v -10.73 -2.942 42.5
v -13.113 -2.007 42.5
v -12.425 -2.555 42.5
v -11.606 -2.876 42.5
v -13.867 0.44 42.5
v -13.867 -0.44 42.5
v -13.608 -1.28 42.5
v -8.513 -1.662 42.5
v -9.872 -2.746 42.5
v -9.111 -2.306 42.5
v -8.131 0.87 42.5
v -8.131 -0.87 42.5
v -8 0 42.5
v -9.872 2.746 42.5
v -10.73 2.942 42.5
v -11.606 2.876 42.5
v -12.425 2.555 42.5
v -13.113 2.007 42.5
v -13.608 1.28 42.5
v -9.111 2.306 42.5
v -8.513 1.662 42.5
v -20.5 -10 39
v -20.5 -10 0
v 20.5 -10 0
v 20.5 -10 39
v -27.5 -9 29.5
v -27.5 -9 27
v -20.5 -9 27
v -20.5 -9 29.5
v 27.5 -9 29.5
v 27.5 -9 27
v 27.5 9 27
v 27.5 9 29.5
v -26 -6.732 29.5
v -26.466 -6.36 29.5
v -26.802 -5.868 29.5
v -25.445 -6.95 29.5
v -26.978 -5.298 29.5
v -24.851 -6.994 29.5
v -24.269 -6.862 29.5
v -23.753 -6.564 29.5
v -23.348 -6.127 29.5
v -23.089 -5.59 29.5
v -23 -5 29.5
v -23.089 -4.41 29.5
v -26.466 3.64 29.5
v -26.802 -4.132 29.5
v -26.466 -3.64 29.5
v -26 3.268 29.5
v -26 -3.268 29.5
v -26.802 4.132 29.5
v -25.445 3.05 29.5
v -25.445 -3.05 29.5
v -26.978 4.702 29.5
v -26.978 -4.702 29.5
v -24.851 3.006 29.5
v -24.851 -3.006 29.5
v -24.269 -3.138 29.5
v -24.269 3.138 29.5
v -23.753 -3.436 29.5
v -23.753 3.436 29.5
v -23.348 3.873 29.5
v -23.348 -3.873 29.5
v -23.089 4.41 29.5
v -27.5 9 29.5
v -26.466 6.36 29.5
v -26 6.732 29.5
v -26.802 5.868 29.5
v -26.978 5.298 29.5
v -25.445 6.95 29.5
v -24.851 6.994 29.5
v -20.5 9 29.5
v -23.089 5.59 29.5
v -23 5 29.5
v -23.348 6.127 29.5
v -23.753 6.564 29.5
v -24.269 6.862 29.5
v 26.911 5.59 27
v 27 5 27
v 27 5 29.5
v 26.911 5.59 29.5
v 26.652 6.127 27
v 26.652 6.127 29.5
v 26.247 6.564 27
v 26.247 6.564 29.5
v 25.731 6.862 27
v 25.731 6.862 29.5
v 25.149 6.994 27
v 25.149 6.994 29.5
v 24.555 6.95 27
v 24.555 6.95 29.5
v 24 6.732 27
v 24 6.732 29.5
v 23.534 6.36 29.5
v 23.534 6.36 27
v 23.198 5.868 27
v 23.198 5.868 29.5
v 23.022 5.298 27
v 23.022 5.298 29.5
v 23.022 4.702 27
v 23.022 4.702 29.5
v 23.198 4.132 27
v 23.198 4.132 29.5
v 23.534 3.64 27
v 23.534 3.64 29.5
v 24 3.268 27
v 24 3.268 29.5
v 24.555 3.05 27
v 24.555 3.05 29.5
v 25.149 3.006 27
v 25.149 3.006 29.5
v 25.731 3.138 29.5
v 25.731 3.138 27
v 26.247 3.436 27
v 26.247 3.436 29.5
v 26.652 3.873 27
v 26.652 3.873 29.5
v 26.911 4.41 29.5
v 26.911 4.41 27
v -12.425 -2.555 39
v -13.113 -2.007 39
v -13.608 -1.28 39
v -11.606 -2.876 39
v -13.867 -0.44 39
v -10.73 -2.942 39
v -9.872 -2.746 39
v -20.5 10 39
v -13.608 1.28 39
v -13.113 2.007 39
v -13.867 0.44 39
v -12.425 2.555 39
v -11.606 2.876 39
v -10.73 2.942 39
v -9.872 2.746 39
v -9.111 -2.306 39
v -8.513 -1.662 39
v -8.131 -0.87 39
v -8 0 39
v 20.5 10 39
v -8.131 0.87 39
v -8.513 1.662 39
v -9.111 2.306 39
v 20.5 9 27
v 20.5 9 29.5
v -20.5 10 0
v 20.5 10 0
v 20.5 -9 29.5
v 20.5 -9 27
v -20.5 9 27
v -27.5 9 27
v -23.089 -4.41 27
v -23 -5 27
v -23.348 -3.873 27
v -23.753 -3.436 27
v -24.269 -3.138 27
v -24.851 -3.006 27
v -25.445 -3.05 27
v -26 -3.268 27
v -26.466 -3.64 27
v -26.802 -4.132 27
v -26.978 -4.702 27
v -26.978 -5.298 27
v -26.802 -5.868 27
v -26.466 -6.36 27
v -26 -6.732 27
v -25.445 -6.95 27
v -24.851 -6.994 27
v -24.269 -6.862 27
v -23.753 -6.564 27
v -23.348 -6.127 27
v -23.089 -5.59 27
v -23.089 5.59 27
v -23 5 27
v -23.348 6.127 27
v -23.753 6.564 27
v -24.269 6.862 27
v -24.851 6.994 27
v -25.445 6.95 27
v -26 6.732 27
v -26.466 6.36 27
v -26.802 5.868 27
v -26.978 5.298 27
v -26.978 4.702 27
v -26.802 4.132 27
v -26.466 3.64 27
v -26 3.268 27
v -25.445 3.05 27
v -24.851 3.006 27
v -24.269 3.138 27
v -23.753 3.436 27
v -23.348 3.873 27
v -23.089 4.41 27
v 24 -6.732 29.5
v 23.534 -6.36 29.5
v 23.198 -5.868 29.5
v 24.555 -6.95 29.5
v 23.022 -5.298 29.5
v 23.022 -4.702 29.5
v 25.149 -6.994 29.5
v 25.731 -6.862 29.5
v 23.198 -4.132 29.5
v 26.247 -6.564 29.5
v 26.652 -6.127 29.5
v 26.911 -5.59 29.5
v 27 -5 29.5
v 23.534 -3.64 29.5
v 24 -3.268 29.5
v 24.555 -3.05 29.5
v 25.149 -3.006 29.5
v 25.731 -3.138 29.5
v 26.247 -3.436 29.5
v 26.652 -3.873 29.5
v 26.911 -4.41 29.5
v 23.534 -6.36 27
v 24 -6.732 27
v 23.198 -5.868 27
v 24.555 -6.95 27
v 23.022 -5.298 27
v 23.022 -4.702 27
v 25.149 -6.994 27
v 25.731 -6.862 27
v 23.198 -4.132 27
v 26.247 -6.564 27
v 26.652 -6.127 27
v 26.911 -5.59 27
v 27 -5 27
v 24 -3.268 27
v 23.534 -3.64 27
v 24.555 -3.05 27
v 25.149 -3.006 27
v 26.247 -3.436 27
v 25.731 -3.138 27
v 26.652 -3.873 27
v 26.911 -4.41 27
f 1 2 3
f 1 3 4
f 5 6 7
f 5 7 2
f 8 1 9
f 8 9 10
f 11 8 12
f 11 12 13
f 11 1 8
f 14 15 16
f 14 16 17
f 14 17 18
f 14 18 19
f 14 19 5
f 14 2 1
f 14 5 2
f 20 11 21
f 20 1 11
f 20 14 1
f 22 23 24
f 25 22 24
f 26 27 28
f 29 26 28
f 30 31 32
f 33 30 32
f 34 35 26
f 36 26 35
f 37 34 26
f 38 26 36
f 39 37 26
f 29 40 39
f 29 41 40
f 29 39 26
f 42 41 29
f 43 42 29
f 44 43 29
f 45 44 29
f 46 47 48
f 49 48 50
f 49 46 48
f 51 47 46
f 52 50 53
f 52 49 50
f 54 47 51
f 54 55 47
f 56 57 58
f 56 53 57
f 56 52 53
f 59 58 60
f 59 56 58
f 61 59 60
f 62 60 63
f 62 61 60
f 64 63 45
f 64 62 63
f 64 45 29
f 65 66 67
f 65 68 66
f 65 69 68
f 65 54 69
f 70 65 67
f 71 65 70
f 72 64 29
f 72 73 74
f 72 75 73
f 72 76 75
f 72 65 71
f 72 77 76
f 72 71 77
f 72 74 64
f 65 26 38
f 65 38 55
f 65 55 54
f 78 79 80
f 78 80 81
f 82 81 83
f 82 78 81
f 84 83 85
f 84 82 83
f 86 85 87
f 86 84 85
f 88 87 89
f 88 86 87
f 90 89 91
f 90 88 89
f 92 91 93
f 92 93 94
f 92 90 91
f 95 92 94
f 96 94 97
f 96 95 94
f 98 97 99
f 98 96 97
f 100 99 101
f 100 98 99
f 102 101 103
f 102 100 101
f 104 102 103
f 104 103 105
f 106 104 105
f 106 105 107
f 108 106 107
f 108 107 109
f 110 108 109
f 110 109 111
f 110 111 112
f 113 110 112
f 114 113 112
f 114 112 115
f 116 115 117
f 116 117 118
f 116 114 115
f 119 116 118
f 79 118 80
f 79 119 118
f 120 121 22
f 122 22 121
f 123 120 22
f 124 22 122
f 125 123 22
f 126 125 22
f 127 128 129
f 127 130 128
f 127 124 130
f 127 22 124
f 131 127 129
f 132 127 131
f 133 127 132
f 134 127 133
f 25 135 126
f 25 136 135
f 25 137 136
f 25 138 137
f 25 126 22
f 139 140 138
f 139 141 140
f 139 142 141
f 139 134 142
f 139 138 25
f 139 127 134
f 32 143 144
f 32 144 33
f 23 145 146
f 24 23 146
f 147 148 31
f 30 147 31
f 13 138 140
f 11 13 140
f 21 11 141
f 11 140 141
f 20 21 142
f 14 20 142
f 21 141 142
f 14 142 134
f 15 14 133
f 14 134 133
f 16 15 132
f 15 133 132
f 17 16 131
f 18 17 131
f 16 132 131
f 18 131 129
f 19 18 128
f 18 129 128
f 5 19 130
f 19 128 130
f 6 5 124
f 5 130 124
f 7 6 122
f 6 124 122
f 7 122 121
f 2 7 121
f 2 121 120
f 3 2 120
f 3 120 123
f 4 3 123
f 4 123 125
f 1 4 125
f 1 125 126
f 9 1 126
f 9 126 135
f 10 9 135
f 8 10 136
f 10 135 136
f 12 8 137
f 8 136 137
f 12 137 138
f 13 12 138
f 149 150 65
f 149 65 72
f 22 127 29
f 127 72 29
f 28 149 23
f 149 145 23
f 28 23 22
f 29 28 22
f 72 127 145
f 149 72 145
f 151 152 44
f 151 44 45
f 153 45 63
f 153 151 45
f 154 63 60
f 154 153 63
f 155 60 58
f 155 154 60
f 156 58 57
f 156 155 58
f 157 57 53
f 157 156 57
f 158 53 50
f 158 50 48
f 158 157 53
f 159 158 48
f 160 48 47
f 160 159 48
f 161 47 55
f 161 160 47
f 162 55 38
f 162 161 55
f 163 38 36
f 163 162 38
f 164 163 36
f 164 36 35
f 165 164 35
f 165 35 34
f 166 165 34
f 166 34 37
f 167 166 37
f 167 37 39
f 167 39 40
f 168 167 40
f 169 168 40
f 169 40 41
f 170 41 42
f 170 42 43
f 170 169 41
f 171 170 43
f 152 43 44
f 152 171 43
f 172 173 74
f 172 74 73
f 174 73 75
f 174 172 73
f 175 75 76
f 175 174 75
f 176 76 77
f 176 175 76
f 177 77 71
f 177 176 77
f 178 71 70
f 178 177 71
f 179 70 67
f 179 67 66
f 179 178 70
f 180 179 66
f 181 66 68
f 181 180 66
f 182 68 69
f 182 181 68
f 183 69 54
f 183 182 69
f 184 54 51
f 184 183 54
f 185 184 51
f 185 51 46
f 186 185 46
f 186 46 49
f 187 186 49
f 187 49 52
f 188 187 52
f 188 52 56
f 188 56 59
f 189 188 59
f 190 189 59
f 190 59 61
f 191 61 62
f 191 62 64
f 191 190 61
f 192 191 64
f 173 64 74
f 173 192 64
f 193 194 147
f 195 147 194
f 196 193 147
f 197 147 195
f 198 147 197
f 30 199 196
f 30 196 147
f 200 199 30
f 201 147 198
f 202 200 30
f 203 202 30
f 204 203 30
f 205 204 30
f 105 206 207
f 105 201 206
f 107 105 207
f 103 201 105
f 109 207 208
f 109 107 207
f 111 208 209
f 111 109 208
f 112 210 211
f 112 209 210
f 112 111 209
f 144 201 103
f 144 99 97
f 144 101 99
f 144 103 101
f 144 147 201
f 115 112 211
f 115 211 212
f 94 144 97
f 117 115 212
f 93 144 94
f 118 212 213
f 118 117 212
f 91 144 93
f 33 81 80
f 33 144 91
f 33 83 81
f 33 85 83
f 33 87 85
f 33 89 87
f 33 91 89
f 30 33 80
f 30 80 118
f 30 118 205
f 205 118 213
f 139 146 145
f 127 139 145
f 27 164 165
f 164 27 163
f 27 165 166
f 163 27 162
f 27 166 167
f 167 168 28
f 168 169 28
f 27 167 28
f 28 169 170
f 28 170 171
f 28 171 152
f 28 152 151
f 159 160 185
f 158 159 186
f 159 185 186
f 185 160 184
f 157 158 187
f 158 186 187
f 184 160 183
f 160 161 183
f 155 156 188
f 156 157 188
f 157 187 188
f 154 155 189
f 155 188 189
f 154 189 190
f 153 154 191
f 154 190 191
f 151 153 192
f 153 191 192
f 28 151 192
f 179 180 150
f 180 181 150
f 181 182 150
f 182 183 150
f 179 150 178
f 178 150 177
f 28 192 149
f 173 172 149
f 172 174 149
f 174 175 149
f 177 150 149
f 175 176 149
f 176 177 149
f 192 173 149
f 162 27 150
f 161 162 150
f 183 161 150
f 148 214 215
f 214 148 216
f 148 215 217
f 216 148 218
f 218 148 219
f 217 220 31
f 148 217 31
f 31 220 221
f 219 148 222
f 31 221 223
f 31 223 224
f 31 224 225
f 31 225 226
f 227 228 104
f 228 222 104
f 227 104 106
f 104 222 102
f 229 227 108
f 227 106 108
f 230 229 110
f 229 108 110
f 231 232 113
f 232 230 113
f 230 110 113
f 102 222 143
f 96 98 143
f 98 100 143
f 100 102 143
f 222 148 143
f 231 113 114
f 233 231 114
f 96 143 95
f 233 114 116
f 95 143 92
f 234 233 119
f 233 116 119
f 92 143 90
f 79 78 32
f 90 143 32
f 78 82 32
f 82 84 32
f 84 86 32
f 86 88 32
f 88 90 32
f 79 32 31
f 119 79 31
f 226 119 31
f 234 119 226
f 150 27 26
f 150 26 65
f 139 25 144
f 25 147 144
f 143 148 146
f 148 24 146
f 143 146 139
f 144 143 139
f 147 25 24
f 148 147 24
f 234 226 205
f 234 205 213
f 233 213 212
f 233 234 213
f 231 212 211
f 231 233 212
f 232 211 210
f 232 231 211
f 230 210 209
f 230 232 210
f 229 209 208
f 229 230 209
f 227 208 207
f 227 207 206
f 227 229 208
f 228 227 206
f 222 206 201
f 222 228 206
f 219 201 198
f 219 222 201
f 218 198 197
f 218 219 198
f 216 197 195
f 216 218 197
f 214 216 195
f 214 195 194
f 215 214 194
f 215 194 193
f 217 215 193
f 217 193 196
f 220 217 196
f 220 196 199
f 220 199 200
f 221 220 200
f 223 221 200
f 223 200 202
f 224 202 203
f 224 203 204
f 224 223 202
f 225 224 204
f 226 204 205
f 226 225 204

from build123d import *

# Parameters (mm, degrees)
F0_W     = 41
F0_H     = 20
F1_DEPTH = 27
F2_W     = 7
F2_H     = 18
F2_R     = 2
F3_DEPTH = 2.5
F4_DEPTH = 12
F5_R     = 2.95
F6_DEPTH = 3.5


with BuildPart() as f1:
    # F0 (on Top) → F1 (new body)
    with BuildSketch(Plane.XY):
        Rectangle(F0_W, F0_H)
    extrude(amount=F1_DEPTH)

    # F2 (on face) → F3 (join)
    with BuildSketch(Plane.XY.offset(27)):
        Polygon((20.5, 9), (20.5, 10), (-20.5, 10), (-20.5, 9), (-20.5, -9), (-20.5, -10), (20.5, -10), (20.5, -9), align=None)
        with Locations((24, 0)):
            Rectangle(F2_W, F2_H)
        with Locations((25, -5)):
            Circle(F2_R, mode=Mode.SUBTRACT)
        with Locations((25, 5)):
            Circle(F2_R, mode=Mode.SUBTRACT)
        with Locations((-24, 0)):
            Rectangle(F2_W, F2_H)
        with Locations((-25, -5)):
            Circle(F2_R, mode=Mode.SUBTRACT)
        with Locations((-25, 5)):
            Circle(F2_R, mode=Mode.SUBTRACT)
    extrude(amount=F3_DEPTH)

    # F2 (on face) → F4 (join)
    with BuildSketch(Plane.XY.offset(27)):
        Polygon((20.5, 9), (20.5, 10), (-20.5, 10), (-20.5, 9), (-20.5, -9), (-20.5, -10), (20.5, -10), (20.5, -9), align=None)
    extrude(amount=F4_DEPTH)

    # F5 (on face) → F6 (join)
    with BuildSketch(Plane.XY.offset(39)):
        with Locations((-10.95, 0)):
            Circle(F5_R)
    extrude(amount=F6_DEPTH)


solid = f1.part
